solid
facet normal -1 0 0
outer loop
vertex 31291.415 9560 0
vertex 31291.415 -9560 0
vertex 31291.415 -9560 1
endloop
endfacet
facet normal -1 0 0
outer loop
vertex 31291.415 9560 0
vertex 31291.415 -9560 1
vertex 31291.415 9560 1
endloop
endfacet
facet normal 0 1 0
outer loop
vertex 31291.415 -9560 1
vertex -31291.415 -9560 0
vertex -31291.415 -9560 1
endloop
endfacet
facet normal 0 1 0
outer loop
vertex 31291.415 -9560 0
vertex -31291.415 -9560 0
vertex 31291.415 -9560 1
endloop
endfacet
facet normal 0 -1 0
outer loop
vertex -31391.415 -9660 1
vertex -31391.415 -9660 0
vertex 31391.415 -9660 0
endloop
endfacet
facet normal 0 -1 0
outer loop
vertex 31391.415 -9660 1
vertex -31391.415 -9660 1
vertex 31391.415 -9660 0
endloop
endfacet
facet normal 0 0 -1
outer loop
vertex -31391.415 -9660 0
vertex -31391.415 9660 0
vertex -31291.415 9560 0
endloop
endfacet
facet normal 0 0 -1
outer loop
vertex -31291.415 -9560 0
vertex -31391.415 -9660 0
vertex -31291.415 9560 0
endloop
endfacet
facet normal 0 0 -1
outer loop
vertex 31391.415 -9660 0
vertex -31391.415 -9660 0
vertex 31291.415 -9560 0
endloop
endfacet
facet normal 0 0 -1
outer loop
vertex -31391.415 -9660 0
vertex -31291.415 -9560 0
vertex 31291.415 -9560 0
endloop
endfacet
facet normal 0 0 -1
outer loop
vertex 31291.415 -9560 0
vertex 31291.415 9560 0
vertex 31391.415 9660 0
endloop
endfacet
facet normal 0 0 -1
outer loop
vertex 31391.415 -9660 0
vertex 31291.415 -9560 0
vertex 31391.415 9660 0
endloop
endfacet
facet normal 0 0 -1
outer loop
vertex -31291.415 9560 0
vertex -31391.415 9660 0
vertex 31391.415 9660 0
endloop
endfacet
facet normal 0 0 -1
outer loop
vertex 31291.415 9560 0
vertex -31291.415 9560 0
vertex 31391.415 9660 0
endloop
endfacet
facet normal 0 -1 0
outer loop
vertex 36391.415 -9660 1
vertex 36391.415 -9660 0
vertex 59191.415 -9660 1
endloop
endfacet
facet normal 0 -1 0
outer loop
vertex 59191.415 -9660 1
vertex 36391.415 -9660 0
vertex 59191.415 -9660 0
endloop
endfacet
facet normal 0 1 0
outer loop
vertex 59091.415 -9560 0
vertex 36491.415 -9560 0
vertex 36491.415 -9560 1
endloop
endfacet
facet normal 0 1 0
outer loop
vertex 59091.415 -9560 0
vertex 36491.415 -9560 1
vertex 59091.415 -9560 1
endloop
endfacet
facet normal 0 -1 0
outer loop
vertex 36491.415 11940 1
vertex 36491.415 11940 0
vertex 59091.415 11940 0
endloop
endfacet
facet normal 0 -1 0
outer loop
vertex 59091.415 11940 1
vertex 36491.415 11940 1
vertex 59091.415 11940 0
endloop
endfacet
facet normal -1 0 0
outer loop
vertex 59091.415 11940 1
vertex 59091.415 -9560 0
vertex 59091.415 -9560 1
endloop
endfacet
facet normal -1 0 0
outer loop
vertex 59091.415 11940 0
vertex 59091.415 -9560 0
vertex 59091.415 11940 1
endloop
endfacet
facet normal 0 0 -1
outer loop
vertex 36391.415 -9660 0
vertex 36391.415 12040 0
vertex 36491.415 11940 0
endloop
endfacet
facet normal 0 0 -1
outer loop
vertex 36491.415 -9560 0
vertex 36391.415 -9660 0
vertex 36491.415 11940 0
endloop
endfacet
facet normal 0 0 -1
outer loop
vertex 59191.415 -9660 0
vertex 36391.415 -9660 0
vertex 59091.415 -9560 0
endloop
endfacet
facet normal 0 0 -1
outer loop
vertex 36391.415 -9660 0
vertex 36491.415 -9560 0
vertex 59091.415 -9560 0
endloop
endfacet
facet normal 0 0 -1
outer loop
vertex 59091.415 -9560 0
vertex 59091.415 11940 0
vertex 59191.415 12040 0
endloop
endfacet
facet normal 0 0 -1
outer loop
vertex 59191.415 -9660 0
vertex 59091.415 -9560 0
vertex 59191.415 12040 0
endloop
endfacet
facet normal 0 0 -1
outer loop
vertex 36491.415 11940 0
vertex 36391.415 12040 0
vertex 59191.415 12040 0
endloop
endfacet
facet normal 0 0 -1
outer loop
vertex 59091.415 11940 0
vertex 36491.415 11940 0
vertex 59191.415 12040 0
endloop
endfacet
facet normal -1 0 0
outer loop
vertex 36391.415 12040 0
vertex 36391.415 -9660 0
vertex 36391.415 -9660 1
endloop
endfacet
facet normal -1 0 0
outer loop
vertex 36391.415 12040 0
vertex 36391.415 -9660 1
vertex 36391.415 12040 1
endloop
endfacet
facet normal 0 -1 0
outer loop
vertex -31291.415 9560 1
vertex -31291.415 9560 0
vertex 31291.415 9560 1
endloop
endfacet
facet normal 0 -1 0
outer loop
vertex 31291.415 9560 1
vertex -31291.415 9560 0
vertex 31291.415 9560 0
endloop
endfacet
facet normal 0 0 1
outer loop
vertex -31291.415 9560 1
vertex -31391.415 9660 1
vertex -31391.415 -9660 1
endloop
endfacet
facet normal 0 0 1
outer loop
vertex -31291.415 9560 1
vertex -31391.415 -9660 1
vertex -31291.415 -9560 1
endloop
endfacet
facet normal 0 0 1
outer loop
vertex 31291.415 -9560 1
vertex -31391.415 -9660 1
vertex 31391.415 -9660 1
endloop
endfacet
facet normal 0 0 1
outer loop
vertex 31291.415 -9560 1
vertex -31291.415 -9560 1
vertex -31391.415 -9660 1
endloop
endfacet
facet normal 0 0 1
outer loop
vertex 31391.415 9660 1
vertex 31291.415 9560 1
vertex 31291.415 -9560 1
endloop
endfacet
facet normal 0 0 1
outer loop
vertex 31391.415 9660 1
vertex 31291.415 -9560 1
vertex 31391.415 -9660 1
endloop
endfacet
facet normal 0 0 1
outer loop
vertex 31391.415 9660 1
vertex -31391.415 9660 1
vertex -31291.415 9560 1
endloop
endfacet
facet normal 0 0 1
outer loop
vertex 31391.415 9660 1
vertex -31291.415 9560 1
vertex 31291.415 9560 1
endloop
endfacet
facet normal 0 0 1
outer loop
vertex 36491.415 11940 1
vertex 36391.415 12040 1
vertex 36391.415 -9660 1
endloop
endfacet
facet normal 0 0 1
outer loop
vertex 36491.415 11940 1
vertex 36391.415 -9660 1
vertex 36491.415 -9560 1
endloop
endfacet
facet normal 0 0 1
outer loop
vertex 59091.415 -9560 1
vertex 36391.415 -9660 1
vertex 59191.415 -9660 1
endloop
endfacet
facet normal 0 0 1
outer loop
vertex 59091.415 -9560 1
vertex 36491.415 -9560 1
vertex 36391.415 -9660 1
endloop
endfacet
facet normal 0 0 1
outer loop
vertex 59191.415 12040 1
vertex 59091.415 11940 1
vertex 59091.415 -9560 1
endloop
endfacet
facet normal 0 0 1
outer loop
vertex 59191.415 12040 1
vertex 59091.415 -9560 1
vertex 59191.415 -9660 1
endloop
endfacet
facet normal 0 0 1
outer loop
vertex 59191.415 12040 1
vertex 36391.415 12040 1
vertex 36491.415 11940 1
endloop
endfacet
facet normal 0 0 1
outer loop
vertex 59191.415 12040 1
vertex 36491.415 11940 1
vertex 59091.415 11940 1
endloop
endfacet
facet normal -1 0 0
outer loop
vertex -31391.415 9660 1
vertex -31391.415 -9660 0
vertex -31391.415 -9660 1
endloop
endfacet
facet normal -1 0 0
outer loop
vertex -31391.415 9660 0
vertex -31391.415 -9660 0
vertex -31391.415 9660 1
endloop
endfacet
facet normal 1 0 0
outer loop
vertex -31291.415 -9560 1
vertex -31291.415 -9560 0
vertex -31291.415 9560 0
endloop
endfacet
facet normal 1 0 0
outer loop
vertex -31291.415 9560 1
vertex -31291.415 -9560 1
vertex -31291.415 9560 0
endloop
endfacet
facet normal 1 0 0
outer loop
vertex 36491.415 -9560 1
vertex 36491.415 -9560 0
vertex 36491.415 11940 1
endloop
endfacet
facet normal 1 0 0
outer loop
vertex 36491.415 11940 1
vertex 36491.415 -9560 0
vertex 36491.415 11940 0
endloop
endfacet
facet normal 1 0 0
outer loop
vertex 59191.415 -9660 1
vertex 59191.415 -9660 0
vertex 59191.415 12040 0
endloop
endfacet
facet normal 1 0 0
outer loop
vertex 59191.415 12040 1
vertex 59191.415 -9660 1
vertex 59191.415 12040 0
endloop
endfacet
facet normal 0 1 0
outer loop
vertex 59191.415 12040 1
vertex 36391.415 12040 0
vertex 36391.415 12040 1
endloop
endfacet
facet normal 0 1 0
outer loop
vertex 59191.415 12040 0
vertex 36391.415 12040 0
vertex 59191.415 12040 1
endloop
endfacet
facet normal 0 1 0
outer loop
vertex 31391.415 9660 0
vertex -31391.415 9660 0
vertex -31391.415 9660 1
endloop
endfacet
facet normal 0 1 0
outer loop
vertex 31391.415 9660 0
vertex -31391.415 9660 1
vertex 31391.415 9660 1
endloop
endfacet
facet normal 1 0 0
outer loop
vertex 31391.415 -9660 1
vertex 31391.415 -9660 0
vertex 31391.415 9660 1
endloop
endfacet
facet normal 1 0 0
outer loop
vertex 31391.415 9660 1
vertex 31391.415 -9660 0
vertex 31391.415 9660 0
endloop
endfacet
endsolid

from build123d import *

# Parameters (mm, degrees)
CROQUIS1_W              = 62782.83
CROQUIS1_H              = 19320
CROQUIS1_W_2            = 62582.83
CROQUIS1_H_2            = 19120
SALIENTE_EXTRUIR1_DEPTH = 1
CROQUIS3_W              = 22800
CROQUIS3_H              = 21700
CROQUIS3_W_2            = 22600
CROQUIS3_H_2            = 21500
SALIENTE_EXTRUIR2_DEPTH = 1


with BuildPart() as part:
    # Croquis1 → Saliente-Extruir1 (new body)
    with BuildSketch(Plane.XY):
        Rectangle(CROQUIS1_W, CROQUIS1_H)
        Rectangle(CROQUIS1_W_2, CROQUIS1_H_2, mode=Mode.SUBTRACT)
    extrude(amount=SALIENTE_EXTRUIR1_DEPTH)


with BuildPart() as body_2:
    # Croquis3 → Saliente-Extruir2 (new body)
    with BuildSketch(Plane.XY):
        with Locations((47791.415, 1190)):
            Rectangle(CROQUIS3_W, CROQUIS3_H)
        with Locations((47791.415, 1190)):
            Rectangle(CROQUIS3_W_2, CROQUIS3_H_2, mode=Mode.SUBTRACT)
    extrude(amount=SALIENTE_EXTRUIR2_DEPTH)


solid = Compound([part.part, body_2.part])
